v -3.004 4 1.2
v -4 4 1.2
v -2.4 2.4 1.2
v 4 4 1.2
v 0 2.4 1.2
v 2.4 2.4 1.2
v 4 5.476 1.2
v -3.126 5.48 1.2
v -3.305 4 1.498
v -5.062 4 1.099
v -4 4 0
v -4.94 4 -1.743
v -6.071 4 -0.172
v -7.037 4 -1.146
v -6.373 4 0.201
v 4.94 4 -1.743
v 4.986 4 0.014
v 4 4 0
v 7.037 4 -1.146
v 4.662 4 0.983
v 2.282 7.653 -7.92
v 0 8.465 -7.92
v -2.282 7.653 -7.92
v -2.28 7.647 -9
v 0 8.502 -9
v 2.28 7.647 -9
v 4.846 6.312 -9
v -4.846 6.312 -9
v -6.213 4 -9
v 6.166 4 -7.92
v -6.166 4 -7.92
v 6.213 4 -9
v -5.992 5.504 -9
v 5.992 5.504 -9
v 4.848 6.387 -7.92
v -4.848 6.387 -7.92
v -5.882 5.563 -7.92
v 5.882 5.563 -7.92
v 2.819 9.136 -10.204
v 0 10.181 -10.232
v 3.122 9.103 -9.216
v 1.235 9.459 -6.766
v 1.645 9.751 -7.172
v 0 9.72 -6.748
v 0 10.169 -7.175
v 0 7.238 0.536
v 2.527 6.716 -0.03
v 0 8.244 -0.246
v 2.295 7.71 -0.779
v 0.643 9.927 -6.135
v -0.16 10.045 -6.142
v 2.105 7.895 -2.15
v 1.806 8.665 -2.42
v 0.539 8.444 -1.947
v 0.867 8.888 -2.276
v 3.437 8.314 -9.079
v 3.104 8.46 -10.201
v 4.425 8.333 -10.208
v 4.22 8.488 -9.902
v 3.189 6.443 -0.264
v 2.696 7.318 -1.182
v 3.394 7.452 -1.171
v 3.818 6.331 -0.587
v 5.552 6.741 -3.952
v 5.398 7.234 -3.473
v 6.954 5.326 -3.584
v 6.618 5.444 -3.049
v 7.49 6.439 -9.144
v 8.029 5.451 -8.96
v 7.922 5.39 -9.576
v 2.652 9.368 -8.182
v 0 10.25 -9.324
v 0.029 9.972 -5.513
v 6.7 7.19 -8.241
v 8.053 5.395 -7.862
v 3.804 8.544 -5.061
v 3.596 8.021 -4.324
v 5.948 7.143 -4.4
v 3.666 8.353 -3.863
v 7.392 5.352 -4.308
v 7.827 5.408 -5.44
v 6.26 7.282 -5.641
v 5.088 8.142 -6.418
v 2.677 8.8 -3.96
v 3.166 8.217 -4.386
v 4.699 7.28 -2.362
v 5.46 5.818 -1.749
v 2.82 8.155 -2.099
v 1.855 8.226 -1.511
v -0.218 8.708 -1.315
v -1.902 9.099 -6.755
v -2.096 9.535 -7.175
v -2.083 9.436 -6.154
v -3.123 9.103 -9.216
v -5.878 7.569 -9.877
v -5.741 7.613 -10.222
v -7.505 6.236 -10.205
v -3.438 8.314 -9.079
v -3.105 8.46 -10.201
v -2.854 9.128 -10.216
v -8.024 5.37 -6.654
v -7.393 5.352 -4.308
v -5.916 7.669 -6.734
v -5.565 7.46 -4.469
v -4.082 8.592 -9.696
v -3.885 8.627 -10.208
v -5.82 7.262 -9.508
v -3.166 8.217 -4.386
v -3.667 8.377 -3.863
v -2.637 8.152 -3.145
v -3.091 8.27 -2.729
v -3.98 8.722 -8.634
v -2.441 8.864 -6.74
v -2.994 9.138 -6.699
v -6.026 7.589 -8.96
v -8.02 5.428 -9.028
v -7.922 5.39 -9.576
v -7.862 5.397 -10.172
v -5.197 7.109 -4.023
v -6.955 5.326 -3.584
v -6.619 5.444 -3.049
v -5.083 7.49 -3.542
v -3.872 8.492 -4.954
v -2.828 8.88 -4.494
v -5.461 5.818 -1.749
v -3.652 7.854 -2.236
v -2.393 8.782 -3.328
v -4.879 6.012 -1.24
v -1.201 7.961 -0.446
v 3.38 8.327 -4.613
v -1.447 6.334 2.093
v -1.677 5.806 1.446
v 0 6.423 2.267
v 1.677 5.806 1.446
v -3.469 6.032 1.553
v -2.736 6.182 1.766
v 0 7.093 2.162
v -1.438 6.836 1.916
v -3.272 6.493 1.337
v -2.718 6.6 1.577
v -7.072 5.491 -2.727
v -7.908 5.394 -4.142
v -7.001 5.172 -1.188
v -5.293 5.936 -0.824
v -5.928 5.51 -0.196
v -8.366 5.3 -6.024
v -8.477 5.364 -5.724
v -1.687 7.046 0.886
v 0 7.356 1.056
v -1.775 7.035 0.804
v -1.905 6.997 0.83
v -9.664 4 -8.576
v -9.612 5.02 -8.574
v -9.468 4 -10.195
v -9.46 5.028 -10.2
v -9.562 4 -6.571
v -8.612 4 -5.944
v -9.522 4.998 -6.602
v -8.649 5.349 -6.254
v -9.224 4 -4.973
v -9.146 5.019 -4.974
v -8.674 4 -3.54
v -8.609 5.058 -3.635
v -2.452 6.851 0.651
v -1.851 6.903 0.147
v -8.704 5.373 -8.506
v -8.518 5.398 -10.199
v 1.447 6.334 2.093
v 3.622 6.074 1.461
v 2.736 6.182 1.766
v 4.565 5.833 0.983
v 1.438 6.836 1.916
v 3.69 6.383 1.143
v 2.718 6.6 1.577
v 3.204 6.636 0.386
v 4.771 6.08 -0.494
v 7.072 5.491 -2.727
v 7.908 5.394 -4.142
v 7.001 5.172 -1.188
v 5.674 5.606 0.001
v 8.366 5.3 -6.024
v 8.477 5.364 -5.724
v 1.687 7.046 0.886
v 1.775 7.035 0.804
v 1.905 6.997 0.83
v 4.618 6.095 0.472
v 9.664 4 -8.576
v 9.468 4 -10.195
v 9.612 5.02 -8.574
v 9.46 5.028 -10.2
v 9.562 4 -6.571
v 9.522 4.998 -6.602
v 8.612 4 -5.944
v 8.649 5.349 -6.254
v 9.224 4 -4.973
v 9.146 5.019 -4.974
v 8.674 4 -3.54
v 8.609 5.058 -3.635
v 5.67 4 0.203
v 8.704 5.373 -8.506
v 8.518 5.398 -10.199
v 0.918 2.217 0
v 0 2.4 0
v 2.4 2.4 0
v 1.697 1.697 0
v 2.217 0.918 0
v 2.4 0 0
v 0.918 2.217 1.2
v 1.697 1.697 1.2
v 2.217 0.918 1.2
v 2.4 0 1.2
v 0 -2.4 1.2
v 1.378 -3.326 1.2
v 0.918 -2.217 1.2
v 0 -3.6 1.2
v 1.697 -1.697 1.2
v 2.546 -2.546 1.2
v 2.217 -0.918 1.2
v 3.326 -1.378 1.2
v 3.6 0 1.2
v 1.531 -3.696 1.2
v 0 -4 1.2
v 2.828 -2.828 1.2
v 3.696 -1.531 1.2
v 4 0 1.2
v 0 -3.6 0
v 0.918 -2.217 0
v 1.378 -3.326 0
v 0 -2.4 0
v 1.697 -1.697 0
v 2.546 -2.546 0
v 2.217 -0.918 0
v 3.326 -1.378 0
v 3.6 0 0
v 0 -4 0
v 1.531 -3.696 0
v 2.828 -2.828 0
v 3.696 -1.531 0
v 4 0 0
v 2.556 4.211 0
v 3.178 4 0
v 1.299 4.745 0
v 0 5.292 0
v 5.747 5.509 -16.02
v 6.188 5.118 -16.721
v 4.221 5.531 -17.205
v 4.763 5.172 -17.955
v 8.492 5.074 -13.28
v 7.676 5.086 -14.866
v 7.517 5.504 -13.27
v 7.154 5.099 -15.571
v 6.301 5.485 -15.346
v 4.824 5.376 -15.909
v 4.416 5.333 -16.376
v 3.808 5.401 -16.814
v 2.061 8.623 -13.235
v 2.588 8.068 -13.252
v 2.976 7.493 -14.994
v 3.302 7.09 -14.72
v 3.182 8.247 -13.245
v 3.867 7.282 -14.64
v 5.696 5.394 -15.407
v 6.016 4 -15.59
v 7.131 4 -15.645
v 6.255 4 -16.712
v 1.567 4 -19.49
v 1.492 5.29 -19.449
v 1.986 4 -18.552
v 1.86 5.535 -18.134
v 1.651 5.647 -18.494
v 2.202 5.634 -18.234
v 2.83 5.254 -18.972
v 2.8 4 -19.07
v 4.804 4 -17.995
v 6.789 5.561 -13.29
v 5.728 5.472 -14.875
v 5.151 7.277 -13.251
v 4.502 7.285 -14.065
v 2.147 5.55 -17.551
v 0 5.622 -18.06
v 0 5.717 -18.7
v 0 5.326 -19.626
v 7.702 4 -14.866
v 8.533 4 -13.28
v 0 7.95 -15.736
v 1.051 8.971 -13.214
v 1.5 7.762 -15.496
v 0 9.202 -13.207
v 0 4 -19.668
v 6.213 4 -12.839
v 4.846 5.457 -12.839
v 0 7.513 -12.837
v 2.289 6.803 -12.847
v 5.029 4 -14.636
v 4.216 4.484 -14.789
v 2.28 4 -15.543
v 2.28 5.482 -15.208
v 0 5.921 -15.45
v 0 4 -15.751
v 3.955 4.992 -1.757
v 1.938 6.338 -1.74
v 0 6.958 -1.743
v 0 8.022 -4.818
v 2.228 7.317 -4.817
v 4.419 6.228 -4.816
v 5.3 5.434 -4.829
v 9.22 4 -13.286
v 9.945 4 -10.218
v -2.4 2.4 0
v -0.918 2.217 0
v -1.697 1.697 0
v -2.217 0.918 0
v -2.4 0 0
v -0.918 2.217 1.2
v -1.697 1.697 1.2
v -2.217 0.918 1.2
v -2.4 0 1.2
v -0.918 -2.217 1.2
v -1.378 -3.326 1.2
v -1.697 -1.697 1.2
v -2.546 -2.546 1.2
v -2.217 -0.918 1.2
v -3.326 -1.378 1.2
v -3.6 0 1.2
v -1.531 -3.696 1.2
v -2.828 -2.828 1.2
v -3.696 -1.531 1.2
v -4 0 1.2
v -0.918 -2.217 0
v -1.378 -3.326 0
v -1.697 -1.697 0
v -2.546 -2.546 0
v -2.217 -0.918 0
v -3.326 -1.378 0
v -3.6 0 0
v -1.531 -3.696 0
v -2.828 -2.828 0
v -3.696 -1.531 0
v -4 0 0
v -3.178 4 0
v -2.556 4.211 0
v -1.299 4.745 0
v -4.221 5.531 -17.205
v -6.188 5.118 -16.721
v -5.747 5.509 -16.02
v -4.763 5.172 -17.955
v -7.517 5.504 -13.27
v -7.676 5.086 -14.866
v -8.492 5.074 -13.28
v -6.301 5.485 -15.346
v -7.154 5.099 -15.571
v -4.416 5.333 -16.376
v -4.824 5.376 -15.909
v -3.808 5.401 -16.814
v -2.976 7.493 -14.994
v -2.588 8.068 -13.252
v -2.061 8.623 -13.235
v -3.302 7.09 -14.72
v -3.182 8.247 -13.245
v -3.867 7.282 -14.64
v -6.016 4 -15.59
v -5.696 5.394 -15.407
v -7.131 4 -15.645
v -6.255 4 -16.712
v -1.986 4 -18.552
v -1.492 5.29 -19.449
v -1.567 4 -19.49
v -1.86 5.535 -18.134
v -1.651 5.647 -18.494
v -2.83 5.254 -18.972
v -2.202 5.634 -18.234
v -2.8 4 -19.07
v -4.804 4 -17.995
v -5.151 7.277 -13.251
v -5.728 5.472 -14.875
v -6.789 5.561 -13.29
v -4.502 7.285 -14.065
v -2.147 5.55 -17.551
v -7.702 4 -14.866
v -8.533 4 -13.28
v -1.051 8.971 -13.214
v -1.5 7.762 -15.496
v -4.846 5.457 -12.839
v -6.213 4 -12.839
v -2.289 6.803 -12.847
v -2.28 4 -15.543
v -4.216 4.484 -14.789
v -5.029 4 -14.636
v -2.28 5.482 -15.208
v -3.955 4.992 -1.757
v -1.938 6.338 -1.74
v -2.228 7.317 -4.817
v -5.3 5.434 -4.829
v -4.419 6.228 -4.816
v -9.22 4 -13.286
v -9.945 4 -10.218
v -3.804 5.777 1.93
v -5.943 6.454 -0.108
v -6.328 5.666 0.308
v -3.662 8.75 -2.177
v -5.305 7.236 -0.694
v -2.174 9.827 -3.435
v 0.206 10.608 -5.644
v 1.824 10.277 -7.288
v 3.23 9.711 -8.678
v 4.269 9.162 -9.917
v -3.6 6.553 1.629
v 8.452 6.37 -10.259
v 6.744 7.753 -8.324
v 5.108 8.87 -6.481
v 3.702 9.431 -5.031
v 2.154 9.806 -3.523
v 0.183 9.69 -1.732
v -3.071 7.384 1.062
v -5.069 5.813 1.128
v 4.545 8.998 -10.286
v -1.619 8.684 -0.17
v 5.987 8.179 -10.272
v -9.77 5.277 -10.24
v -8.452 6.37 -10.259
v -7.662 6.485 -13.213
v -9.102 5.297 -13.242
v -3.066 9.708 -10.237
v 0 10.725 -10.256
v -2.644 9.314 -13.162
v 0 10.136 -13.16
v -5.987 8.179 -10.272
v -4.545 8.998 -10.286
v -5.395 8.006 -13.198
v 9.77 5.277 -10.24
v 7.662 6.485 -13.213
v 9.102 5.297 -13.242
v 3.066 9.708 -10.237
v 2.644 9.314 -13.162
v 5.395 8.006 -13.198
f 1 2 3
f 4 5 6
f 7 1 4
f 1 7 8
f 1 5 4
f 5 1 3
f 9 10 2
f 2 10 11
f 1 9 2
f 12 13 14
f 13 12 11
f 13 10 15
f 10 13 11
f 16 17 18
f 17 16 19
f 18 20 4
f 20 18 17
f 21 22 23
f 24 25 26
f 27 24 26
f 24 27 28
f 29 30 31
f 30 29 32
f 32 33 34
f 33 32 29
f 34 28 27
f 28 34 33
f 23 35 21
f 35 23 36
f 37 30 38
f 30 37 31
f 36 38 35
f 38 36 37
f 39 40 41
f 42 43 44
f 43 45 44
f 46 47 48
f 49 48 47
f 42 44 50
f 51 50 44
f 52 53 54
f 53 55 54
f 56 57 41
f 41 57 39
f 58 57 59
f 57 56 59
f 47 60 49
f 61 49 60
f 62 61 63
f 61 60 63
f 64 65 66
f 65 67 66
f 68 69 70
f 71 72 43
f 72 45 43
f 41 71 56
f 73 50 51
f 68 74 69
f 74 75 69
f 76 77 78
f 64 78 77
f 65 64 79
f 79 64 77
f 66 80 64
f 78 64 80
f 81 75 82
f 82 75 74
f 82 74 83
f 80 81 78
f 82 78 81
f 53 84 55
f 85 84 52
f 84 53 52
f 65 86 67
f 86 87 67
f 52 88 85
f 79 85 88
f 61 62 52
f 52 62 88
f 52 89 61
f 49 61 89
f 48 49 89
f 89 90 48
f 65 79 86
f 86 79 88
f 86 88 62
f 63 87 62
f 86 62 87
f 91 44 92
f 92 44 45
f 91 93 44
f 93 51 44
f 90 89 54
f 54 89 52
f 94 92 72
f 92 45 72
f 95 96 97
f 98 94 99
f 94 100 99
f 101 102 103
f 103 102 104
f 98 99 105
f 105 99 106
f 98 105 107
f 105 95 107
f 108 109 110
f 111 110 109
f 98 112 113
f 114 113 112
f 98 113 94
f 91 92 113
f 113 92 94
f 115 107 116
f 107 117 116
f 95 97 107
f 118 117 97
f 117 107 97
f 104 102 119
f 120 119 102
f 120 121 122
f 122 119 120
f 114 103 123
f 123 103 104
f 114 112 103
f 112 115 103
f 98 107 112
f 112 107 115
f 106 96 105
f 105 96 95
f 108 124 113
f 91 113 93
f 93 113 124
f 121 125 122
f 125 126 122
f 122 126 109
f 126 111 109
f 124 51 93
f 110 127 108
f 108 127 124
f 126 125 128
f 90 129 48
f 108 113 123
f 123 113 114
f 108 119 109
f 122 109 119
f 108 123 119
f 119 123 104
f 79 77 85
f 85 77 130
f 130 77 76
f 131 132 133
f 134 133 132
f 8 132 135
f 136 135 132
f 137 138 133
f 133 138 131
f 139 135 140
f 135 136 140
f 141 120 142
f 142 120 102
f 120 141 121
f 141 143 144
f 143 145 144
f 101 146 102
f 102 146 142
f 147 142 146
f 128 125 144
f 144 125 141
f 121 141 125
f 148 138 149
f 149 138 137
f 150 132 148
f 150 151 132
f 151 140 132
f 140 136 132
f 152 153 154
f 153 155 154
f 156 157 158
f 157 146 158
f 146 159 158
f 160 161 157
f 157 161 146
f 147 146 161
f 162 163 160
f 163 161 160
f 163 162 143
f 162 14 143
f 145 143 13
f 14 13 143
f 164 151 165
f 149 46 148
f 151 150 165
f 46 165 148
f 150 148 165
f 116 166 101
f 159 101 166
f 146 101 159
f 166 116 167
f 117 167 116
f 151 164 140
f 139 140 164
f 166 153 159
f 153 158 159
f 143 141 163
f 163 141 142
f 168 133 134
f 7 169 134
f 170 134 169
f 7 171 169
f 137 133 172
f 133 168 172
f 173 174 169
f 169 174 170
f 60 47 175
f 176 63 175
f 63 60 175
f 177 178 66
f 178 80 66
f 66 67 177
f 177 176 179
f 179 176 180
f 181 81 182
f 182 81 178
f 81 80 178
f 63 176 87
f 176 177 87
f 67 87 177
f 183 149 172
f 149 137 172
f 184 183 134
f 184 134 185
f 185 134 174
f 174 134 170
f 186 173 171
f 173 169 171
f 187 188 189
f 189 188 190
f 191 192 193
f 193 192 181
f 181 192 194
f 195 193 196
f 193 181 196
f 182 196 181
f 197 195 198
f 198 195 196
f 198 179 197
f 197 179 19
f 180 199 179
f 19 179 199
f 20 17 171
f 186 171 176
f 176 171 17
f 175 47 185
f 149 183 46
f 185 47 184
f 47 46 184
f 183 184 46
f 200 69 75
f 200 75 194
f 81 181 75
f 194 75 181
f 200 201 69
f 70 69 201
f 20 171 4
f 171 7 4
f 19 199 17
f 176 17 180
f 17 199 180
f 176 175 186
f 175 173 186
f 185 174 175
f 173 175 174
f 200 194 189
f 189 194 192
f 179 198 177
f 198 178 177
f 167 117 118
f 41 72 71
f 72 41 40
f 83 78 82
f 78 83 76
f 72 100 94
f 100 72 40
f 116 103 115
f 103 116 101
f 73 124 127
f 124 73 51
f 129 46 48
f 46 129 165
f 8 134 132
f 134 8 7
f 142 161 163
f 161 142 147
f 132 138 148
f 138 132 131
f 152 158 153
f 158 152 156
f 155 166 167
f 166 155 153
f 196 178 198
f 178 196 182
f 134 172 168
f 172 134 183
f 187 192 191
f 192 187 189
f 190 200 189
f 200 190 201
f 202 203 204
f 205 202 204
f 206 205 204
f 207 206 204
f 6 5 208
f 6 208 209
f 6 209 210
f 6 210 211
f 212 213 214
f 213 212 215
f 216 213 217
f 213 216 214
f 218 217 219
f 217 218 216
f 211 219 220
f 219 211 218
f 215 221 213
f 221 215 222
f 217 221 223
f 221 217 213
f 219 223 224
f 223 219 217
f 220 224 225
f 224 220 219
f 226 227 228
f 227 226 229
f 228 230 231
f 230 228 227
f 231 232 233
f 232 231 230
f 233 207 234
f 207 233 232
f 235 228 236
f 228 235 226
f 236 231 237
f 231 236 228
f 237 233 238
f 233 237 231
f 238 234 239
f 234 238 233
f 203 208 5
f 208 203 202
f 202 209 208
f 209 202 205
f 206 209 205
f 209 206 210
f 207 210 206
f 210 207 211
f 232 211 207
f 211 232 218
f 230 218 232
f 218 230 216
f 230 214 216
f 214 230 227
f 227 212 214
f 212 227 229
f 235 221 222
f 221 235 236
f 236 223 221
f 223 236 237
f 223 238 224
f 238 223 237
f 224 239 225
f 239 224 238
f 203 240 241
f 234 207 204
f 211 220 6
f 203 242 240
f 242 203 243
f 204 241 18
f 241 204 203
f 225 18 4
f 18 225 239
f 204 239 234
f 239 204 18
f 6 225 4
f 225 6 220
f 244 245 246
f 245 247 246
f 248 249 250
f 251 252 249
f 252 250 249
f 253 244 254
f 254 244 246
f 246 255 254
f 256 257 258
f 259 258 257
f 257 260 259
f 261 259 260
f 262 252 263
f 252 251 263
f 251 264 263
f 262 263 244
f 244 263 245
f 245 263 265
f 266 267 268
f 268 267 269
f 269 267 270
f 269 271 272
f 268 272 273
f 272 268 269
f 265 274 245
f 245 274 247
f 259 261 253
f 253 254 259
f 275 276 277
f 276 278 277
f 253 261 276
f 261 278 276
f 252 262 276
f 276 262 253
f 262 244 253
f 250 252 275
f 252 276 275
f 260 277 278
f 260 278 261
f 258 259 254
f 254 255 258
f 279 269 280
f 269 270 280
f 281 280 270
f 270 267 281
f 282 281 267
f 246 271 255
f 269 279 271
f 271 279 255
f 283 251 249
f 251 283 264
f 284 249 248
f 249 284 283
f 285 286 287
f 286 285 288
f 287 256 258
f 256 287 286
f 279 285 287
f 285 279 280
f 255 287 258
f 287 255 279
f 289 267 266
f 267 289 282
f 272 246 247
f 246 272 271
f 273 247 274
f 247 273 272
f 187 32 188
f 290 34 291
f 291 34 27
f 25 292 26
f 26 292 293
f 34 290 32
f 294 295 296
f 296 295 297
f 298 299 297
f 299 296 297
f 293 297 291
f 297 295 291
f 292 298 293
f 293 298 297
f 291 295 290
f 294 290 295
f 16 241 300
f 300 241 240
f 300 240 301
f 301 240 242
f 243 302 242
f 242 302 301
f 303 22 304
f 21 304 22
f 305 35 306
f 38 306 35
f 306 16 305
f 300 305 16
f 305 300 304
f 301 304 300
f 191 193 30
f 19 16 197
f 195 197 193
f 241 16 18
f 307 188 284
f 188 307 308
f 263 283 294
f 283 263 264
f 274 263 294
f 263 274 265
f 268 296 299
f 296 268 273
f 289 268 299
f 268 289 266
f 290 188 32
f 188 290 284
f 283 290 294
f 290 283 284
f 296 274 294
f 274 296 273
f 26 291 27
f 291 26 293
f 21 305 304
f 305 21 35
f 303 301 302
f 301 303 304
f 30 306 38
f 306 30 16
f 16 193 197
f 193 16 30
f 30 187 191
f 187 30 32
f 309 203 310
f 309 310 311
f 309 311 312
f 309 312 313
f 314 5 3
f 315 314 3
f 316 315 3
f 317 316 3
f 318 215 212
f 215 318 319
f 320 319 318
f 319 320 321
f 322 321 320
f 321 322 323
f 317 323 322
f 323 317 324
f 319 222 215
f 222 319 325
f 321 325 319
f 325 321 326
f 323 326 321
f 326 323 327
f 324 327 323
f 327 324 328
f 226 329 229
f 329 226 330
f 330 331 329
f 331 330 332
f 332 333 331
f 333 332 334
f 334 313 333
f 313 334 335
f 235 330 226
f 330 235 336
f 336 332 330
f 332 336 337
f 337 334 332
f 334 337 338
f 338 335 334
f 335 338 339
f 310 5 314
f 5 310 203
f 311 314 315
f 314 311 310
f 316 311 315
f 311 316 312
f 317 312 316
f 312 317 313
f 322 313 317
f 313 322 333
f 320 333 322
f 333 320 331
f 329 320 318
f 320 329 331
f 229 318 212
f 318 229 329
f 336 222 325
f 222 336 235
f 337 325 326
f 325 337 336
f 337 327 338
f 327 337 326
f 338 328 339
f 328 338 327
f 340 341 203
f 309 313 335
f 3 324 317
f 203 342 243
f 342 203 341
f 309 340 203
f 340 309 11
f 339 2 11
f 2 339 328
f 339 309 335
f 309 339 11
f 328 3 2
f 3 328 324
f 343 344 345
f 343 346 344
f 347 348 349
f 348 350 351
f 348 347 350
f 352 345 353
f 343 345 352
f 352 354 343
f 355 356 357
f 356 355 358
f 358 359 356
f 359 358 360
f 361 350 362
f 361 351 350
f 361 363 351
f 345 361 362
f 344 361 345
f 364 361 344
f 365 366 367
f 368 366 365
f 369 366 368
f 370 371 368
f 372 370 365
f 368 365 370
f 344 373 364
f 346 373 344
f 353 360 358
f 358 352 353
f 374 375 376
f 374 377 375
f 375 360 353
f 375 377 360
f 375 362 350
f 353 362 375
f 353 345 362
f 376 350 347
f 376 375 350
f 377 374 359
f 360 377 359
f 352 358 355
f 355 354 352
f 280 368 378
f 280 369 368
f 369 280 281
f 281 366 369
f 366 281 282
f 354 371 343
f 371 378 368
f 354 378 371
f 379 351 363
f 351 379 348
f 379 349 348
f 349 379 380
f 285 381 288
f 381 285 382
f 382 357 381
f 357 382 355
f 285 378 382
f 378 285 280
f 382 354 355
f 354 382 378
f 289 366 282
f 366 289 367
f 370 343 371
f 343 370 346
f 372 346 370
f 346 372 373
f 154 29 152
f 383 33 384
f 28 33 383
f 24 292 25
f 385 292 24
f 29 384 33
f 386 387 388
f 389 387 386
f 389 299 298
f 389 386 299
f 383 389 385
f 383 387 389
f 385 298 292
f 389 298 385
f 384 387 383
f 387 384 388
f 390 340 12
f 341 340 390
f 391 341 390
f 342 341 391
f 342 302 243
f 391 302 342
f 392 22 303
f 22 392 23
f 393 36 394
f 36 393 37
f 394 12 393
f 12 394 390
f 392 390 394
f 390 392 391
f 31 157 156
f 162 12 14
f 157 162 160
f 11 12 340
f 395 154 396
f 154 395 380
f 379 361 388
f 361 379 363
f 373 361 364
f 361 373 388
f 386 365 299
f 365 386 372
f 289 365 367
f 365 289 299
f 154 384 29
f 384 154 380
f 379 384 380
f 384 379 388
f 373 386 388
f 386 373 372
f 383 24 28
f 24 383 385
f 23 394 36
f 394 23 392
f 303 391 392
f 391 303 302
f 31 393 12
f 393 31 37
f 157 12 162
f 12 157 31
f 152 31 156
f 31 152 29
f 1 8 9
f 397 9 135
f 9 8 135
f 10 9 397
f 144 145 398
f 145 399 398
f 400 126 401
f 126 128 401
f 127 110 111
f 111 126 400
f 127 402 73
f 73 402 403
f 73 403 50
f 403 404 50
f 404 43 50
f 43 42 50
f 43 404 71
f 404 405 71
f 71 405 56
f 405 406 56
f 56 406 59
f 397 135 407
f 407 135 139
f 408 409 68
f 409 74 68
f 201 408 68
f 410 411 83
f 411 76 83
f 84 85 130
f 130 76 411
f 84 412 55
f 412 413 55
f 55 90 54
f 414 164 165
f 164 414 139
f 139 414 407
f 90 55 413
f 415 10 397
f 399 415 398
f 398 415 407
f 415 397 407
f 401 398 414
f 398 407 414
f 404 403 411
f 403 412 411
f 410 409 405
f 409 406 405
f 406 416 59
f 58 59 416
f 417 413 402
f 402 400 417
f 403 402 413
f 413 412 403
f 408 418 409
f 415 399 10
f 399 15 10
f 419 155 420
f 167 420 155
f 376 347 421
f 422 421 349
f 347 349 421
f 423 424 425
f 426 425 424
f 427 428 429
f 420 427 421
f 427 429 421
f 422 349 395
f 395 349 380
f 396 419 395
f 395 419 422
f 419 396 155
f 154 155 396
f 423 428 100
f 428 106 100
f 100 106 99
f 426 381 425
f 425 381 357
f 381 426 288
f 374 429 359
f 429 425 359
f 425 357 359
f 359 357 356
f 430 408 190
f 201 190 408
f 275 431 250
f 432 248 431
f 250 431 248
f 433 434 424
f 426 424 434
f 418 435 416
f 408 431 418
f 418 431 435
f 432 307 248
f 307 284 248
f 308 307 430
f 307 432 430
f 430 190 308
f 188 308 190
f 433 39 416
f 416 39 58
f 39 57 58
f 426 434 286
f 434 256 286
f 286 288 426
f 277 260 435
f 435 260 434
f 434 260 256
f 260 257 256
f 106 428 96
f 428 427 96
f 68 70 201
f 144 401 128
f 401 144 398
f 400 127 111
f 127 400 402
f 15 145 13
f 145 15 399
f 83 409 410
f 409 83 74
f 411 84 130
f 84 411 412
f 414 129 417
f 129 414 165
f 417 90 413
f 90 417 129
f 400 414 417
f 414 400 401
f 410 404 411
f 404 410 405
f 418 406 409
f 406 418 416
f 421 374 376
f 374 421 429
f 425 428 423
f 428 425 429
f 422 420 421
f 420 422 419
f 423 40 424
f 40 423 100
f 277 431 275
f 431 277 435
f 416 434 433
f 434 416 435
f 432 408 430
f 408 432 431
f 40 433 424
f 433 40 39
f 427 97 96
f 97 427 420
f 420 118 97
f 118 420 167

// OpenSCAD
use <../lib.scad>
use <s/12610s01.scad>
use <s/12610s02.scad>
use <s/12610s03.scad>
function ldraw_lib__12610() = [
// 0 Minifig Ninja Turtle Shell with Horizontal and Diagonal Belts
// 0 Name: 12610.dat
// 0 Author: Chris Böhnke [KnightOfTarenta]
// 0 !LDRAW_ORG Part UPDATE 2026-08
// 0 !LICENSE Licensed under CC BY 4.0 : see CAreadme.txt
// 
// 0 BFC CERTIFY CCW
  [0,"BFC","CERTIFY"],
  [0,"BFC","CCW"],
// 
// 0 !CATEGORY Minifig Neckwear
// 
// 0 !PREVIEW 16 0 0 0 -1 0 0 0 1 0 0 0 -1
// 
// 0 !HISTORY 2013-08-30 {LEGO Digital Designer} Original part shape
// 0 !HISTORY 2025-08-04 [KnightOfTarenta] File preparation for LDraw Parts Tracker
// 0 !HISTORY 2026-08-31 [OrionP] Official Update 2026-08
// 
// 0 // Shell
// 1 16 0 0 0 1 0 0 0 1 0 0 0 1 s\12610s01.dat
  [1,16,0,0,0,1,0,0,0,1,0,0,0,1, ldraw_lib__s__12610s01()],
// 1 16 0 0 0 1 0 0 0 1 0 0 0 1 s\12610s03.dat
  [1,16,0,0,0,1,0,0,0,1,0,0,0,1, ldraw_lib__s__12610s03()],
// 1 16 0 0 0 -1 0 0 0 1 0 0 0 1 s\12610s03.dat
  [1,16,0,0,0,-1,0,0,0,1,0,0,0,1, ldraw_lib__s__12610s03()],
// 
// 0 // Belt
// 1 16 0 0 0 1 0 0 0 1 0 0 0 1 s\12610s02.dat
  [1,16,0,0,0,1,0,0,0,1,0,0,0,1, ldraw_lib__s__12610s02()],
];
module ldraw_lib__12610(step=0, col=false, unit=2/5, alt=false, line=0.2, solid=!$preview)
    makepoly(ldraw_lib__12610(), step=step, col=col, unit=unit, alt=alt, line=line, solid=solid);
ldraw_lib__12610(line=0.2);
